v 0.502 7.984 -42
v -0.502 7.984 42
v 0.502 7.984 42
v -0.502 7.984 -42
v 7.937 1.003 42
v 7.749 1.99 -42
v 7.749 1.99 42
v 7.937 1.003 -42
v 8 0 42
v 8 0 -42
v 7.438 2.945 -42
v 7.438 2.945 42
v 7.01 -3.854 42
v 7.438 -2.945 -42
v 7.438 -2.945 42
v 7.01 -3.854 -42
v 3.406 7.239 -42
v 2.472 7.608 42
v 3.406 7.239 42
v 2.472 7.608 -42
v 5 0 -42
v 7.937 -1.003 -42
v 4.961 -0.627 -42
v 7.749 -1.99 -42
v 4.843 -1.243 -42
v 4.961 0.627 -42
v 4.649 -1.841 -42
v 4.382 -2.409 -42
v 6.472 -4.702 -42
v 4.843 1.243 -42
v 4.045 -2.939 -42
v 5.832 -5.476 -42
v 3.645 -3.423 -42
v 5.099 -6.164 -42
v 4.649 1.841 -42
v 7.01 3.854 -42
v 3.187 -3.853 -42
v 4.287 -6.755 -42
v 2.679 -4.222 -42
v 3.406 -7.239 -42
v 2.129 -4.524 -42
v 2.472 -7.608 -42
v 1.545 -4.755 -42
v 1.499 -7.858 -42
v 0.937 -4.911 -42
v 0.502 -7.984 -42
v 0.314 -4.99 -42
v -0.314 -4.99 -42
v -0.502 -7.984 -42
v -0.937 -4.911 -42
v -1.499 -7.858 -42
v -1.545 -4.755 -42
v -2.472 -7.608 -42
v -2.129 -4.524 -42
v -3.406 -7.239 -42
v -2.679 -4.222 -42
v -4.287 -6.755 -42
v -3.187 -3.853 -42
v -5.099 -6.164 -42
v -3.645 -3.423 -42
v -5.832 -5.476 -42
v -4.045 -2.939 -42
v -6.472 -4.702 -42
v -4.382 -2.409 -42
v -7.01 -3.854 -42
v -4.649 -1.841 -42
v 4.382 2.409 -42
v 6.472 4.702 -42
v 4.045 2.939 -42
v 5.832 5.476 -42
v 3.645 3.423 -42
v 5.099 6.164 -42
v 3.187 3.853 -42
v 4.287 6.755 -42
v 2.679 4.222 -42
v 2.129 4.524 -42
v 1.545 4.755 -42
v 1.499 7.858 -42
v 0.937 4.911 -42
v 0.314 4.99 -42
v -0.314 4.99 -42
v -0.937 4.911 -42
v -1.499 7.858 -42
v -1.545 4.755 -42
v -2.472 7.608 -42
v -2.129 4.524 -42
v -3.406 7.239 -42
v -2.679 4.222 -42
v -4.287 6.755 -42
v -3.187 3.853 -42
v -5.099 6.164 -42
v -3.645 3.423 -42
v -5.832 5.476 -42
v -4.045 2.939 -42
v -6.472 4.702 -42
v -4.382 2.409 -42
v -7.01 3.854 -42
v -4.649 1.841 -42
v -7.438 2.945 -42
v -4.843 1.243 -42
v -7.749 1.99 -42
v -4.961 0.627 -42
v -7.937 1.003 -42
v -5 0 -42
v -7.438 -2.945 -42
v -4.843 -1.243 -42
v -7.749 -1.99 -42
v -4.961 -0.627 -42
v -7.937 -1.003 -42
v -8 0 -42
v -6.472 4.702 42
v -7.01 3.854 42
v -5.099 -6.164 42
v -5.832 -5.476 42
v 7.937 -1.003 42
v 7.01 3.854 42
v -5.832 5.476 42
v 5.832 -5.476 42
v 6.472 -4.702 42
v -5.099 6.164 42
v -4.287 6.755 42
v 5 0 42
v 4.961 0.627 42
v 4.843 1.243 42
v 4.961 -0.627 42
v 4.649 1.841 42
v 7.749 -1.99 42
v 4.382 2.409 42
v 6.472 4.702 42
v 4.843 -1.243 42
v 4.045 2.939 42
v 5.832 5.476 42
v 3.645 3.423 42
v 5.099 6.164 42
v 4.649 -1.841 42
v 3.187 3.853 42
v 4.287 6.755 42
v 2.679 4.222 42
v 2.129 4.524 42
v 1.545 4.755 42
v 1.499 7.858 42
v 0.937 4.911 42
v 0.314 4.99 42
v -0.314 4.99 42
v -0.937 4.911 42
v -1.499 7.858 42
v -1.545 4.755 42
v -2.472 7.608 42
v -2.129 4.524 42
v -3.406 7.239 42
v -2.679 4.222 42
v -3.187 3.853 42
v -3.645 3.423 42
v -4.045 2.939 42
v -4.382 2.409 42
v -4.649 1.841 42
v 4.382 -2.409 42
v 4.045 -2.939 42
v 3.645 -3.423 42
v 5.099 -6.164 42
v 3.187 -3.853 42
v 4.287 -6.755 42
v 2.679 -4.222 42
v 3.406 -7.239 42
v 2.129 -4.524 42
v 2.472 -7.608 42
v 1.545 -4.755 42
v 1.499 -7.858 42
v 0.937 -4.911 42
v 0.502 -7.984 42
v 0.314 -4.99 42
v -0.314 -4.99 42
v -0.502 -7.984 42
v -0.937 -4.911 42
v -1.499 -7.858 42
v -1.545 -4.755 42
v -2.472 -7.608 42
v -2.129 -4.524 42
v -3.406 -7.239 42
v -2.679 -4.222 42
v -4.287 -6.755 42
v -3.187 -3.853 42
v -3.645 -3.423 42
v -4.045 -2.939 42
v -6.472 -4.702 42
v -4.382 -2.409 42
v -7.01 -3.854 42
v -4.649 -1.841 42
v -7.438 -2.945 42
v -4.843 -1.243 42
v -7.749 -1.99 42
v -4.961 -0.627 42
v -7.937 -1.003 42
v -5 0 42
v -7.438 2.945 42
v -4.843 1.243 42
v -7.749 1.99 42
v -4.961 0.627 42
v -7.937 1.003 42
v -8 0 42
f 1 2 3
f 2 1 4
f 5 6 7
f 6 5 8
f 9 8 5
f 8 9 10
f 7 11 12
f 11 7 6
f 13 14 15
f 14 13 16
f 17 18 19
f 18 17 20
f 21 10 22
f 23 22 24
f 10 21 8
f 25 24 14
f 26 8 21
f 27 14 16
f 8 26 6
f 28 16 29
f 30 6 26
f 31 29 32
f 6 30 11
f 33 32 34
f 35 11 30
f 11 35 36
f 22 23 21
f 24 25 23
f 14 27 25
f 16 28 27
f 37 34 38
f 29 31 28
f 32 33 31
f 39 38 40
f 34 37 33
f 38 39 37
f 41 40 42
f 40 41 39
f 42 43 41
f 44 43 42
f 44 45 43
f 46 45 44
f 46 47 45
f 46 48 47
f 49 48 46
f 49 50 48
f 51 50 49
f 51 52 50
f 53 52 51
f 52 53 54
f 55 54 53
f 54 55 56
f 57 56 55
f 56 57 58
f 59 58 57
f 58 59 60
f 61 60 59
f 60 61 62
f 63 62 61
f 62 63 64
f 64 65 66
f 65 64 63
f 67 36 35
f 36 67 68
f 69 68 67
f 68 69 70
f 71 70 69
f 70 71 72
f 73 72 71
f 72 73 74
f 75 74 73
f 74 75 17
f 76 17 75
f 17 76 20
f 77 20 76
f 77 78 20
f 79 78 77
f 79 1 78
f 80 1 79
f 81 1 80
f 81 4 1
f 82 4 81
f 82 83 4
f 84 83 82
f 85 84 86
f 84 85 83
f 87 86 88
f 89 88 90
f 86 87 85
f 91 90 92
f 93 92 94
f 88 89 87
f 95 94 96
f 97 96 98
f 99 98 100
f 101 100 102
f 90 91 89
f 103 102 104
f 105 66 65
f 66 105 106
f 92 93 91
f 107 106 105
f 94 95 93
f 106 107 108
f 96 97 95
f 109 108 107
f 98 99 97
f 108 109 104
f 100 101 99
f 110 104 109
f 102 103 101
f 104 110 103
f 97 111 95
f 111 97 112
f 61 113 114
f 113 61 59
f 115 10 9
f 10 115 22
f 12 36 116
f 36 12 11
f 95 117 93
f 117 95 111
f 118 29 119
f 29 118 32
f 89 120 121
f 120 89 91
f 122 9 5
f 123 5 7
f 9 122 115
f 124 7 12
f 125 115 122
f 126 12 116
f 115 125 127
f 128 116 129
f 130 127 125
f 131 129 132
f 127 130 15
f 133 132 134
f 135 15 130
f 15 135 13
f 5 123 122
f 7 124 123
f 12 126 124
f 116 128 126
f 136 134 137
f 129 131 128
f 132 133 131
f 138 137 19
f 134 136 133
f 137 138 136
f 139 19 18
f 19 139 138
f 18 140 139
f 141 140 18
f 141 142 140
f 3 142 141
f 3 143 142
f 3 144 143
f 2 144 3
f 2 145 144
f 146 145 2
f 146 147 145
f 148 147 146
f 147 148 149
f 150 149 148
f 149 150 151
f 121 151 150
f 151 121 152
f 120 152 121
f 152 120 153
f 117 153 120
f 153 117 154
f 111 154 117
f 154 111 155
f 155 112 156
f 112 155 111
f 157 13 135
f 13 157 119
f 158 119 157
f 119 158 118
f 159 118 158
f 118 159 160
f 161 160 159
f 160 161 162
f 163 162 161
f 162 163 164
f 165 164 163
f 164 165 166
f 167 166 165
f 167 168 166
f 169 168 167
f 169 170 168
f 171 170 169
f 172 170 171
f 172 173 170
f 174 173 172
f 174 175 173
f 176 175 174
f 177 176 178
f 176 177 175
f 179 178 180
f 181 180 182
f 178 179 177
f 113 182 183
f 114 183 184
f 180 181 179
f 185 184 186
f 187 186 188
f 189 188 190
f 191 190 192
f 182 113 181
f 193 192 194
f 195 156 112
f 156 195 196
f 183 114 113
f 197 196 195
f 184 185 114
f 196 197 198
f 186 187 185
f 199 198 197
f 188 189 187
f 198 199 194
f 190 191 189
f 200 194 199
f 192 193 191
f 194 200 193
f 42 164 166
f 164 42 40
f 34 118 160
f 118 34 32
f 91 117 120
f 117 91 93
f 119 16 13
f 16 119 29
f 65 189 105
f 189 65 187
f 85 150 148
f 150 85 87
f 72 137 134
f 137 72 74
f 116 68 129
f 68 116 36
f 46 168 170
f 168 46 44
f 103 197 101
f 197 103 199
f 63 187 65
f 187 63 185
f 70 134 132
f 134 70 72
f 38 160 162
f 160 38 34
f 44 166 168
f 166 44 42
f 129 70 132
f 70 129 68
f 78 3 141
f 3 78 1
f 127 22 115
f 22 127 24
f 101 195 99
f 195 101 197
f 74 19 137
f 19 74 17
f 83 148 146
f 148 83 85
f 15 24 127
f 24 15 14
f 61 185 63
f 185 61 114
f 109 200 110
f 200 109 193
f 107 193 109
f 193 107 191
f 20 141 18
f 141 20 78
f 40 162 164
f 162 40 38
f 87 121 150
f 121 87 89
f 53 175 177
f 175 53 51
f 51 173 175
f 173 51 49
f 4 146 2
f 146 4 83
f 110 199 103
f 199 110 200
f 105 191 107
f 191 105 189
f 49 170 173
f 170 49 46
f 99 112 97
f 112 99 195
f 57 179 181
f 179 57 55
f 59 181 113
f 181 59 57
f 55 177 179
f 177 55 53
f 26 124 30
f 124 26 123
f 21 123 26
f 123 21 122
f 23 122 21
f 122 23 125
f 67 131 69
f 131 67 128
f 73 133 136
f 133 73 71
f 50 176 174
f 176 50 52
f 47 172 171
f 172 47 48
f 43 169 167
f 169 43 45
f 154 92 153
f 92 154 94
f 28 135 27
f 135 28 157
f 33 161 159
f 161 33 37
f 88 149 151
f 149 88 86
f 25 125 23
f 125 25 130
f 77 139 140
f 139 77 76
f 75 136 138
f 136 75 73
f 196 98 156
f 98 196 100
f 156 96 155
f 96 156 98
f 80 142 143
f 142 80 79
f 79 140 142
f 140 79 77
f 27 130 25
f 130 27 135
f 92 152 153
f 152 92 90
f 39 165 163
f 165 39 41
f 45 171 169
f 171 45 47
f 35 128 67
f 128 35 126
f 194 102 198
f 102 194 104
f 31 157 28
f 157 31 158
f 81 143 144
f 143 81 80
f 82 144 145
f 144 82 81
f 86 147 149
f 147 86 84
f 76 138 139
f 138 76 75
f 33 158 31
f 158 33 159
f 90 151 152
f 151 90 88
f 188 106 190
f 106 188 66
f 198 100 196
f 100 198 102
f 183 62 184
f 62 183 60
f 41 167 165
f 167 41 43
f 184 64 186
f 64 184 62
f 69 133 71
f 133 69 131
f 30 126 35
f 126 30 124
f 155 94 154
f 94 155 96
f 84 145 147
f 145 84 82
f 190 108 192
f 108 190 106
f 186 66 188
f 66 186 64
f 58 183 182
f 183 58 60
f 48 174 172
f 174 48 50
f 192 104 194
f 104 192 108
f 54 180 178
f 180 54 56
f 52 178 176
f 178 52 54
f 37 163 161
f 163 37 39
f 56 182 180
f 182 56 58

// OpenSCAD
$fn = 50;


difference() {
	union() {
		translate(v = [0, 0, -42.0000000000]) {
			cylinder(h = 84, r = 8.0000000000);
		}
	}
	union() {
		translate(v = [0, 0, -100.0000000000]) {
			cylinder(h = 200, r = 5.0000000000);
		}
	}
}
